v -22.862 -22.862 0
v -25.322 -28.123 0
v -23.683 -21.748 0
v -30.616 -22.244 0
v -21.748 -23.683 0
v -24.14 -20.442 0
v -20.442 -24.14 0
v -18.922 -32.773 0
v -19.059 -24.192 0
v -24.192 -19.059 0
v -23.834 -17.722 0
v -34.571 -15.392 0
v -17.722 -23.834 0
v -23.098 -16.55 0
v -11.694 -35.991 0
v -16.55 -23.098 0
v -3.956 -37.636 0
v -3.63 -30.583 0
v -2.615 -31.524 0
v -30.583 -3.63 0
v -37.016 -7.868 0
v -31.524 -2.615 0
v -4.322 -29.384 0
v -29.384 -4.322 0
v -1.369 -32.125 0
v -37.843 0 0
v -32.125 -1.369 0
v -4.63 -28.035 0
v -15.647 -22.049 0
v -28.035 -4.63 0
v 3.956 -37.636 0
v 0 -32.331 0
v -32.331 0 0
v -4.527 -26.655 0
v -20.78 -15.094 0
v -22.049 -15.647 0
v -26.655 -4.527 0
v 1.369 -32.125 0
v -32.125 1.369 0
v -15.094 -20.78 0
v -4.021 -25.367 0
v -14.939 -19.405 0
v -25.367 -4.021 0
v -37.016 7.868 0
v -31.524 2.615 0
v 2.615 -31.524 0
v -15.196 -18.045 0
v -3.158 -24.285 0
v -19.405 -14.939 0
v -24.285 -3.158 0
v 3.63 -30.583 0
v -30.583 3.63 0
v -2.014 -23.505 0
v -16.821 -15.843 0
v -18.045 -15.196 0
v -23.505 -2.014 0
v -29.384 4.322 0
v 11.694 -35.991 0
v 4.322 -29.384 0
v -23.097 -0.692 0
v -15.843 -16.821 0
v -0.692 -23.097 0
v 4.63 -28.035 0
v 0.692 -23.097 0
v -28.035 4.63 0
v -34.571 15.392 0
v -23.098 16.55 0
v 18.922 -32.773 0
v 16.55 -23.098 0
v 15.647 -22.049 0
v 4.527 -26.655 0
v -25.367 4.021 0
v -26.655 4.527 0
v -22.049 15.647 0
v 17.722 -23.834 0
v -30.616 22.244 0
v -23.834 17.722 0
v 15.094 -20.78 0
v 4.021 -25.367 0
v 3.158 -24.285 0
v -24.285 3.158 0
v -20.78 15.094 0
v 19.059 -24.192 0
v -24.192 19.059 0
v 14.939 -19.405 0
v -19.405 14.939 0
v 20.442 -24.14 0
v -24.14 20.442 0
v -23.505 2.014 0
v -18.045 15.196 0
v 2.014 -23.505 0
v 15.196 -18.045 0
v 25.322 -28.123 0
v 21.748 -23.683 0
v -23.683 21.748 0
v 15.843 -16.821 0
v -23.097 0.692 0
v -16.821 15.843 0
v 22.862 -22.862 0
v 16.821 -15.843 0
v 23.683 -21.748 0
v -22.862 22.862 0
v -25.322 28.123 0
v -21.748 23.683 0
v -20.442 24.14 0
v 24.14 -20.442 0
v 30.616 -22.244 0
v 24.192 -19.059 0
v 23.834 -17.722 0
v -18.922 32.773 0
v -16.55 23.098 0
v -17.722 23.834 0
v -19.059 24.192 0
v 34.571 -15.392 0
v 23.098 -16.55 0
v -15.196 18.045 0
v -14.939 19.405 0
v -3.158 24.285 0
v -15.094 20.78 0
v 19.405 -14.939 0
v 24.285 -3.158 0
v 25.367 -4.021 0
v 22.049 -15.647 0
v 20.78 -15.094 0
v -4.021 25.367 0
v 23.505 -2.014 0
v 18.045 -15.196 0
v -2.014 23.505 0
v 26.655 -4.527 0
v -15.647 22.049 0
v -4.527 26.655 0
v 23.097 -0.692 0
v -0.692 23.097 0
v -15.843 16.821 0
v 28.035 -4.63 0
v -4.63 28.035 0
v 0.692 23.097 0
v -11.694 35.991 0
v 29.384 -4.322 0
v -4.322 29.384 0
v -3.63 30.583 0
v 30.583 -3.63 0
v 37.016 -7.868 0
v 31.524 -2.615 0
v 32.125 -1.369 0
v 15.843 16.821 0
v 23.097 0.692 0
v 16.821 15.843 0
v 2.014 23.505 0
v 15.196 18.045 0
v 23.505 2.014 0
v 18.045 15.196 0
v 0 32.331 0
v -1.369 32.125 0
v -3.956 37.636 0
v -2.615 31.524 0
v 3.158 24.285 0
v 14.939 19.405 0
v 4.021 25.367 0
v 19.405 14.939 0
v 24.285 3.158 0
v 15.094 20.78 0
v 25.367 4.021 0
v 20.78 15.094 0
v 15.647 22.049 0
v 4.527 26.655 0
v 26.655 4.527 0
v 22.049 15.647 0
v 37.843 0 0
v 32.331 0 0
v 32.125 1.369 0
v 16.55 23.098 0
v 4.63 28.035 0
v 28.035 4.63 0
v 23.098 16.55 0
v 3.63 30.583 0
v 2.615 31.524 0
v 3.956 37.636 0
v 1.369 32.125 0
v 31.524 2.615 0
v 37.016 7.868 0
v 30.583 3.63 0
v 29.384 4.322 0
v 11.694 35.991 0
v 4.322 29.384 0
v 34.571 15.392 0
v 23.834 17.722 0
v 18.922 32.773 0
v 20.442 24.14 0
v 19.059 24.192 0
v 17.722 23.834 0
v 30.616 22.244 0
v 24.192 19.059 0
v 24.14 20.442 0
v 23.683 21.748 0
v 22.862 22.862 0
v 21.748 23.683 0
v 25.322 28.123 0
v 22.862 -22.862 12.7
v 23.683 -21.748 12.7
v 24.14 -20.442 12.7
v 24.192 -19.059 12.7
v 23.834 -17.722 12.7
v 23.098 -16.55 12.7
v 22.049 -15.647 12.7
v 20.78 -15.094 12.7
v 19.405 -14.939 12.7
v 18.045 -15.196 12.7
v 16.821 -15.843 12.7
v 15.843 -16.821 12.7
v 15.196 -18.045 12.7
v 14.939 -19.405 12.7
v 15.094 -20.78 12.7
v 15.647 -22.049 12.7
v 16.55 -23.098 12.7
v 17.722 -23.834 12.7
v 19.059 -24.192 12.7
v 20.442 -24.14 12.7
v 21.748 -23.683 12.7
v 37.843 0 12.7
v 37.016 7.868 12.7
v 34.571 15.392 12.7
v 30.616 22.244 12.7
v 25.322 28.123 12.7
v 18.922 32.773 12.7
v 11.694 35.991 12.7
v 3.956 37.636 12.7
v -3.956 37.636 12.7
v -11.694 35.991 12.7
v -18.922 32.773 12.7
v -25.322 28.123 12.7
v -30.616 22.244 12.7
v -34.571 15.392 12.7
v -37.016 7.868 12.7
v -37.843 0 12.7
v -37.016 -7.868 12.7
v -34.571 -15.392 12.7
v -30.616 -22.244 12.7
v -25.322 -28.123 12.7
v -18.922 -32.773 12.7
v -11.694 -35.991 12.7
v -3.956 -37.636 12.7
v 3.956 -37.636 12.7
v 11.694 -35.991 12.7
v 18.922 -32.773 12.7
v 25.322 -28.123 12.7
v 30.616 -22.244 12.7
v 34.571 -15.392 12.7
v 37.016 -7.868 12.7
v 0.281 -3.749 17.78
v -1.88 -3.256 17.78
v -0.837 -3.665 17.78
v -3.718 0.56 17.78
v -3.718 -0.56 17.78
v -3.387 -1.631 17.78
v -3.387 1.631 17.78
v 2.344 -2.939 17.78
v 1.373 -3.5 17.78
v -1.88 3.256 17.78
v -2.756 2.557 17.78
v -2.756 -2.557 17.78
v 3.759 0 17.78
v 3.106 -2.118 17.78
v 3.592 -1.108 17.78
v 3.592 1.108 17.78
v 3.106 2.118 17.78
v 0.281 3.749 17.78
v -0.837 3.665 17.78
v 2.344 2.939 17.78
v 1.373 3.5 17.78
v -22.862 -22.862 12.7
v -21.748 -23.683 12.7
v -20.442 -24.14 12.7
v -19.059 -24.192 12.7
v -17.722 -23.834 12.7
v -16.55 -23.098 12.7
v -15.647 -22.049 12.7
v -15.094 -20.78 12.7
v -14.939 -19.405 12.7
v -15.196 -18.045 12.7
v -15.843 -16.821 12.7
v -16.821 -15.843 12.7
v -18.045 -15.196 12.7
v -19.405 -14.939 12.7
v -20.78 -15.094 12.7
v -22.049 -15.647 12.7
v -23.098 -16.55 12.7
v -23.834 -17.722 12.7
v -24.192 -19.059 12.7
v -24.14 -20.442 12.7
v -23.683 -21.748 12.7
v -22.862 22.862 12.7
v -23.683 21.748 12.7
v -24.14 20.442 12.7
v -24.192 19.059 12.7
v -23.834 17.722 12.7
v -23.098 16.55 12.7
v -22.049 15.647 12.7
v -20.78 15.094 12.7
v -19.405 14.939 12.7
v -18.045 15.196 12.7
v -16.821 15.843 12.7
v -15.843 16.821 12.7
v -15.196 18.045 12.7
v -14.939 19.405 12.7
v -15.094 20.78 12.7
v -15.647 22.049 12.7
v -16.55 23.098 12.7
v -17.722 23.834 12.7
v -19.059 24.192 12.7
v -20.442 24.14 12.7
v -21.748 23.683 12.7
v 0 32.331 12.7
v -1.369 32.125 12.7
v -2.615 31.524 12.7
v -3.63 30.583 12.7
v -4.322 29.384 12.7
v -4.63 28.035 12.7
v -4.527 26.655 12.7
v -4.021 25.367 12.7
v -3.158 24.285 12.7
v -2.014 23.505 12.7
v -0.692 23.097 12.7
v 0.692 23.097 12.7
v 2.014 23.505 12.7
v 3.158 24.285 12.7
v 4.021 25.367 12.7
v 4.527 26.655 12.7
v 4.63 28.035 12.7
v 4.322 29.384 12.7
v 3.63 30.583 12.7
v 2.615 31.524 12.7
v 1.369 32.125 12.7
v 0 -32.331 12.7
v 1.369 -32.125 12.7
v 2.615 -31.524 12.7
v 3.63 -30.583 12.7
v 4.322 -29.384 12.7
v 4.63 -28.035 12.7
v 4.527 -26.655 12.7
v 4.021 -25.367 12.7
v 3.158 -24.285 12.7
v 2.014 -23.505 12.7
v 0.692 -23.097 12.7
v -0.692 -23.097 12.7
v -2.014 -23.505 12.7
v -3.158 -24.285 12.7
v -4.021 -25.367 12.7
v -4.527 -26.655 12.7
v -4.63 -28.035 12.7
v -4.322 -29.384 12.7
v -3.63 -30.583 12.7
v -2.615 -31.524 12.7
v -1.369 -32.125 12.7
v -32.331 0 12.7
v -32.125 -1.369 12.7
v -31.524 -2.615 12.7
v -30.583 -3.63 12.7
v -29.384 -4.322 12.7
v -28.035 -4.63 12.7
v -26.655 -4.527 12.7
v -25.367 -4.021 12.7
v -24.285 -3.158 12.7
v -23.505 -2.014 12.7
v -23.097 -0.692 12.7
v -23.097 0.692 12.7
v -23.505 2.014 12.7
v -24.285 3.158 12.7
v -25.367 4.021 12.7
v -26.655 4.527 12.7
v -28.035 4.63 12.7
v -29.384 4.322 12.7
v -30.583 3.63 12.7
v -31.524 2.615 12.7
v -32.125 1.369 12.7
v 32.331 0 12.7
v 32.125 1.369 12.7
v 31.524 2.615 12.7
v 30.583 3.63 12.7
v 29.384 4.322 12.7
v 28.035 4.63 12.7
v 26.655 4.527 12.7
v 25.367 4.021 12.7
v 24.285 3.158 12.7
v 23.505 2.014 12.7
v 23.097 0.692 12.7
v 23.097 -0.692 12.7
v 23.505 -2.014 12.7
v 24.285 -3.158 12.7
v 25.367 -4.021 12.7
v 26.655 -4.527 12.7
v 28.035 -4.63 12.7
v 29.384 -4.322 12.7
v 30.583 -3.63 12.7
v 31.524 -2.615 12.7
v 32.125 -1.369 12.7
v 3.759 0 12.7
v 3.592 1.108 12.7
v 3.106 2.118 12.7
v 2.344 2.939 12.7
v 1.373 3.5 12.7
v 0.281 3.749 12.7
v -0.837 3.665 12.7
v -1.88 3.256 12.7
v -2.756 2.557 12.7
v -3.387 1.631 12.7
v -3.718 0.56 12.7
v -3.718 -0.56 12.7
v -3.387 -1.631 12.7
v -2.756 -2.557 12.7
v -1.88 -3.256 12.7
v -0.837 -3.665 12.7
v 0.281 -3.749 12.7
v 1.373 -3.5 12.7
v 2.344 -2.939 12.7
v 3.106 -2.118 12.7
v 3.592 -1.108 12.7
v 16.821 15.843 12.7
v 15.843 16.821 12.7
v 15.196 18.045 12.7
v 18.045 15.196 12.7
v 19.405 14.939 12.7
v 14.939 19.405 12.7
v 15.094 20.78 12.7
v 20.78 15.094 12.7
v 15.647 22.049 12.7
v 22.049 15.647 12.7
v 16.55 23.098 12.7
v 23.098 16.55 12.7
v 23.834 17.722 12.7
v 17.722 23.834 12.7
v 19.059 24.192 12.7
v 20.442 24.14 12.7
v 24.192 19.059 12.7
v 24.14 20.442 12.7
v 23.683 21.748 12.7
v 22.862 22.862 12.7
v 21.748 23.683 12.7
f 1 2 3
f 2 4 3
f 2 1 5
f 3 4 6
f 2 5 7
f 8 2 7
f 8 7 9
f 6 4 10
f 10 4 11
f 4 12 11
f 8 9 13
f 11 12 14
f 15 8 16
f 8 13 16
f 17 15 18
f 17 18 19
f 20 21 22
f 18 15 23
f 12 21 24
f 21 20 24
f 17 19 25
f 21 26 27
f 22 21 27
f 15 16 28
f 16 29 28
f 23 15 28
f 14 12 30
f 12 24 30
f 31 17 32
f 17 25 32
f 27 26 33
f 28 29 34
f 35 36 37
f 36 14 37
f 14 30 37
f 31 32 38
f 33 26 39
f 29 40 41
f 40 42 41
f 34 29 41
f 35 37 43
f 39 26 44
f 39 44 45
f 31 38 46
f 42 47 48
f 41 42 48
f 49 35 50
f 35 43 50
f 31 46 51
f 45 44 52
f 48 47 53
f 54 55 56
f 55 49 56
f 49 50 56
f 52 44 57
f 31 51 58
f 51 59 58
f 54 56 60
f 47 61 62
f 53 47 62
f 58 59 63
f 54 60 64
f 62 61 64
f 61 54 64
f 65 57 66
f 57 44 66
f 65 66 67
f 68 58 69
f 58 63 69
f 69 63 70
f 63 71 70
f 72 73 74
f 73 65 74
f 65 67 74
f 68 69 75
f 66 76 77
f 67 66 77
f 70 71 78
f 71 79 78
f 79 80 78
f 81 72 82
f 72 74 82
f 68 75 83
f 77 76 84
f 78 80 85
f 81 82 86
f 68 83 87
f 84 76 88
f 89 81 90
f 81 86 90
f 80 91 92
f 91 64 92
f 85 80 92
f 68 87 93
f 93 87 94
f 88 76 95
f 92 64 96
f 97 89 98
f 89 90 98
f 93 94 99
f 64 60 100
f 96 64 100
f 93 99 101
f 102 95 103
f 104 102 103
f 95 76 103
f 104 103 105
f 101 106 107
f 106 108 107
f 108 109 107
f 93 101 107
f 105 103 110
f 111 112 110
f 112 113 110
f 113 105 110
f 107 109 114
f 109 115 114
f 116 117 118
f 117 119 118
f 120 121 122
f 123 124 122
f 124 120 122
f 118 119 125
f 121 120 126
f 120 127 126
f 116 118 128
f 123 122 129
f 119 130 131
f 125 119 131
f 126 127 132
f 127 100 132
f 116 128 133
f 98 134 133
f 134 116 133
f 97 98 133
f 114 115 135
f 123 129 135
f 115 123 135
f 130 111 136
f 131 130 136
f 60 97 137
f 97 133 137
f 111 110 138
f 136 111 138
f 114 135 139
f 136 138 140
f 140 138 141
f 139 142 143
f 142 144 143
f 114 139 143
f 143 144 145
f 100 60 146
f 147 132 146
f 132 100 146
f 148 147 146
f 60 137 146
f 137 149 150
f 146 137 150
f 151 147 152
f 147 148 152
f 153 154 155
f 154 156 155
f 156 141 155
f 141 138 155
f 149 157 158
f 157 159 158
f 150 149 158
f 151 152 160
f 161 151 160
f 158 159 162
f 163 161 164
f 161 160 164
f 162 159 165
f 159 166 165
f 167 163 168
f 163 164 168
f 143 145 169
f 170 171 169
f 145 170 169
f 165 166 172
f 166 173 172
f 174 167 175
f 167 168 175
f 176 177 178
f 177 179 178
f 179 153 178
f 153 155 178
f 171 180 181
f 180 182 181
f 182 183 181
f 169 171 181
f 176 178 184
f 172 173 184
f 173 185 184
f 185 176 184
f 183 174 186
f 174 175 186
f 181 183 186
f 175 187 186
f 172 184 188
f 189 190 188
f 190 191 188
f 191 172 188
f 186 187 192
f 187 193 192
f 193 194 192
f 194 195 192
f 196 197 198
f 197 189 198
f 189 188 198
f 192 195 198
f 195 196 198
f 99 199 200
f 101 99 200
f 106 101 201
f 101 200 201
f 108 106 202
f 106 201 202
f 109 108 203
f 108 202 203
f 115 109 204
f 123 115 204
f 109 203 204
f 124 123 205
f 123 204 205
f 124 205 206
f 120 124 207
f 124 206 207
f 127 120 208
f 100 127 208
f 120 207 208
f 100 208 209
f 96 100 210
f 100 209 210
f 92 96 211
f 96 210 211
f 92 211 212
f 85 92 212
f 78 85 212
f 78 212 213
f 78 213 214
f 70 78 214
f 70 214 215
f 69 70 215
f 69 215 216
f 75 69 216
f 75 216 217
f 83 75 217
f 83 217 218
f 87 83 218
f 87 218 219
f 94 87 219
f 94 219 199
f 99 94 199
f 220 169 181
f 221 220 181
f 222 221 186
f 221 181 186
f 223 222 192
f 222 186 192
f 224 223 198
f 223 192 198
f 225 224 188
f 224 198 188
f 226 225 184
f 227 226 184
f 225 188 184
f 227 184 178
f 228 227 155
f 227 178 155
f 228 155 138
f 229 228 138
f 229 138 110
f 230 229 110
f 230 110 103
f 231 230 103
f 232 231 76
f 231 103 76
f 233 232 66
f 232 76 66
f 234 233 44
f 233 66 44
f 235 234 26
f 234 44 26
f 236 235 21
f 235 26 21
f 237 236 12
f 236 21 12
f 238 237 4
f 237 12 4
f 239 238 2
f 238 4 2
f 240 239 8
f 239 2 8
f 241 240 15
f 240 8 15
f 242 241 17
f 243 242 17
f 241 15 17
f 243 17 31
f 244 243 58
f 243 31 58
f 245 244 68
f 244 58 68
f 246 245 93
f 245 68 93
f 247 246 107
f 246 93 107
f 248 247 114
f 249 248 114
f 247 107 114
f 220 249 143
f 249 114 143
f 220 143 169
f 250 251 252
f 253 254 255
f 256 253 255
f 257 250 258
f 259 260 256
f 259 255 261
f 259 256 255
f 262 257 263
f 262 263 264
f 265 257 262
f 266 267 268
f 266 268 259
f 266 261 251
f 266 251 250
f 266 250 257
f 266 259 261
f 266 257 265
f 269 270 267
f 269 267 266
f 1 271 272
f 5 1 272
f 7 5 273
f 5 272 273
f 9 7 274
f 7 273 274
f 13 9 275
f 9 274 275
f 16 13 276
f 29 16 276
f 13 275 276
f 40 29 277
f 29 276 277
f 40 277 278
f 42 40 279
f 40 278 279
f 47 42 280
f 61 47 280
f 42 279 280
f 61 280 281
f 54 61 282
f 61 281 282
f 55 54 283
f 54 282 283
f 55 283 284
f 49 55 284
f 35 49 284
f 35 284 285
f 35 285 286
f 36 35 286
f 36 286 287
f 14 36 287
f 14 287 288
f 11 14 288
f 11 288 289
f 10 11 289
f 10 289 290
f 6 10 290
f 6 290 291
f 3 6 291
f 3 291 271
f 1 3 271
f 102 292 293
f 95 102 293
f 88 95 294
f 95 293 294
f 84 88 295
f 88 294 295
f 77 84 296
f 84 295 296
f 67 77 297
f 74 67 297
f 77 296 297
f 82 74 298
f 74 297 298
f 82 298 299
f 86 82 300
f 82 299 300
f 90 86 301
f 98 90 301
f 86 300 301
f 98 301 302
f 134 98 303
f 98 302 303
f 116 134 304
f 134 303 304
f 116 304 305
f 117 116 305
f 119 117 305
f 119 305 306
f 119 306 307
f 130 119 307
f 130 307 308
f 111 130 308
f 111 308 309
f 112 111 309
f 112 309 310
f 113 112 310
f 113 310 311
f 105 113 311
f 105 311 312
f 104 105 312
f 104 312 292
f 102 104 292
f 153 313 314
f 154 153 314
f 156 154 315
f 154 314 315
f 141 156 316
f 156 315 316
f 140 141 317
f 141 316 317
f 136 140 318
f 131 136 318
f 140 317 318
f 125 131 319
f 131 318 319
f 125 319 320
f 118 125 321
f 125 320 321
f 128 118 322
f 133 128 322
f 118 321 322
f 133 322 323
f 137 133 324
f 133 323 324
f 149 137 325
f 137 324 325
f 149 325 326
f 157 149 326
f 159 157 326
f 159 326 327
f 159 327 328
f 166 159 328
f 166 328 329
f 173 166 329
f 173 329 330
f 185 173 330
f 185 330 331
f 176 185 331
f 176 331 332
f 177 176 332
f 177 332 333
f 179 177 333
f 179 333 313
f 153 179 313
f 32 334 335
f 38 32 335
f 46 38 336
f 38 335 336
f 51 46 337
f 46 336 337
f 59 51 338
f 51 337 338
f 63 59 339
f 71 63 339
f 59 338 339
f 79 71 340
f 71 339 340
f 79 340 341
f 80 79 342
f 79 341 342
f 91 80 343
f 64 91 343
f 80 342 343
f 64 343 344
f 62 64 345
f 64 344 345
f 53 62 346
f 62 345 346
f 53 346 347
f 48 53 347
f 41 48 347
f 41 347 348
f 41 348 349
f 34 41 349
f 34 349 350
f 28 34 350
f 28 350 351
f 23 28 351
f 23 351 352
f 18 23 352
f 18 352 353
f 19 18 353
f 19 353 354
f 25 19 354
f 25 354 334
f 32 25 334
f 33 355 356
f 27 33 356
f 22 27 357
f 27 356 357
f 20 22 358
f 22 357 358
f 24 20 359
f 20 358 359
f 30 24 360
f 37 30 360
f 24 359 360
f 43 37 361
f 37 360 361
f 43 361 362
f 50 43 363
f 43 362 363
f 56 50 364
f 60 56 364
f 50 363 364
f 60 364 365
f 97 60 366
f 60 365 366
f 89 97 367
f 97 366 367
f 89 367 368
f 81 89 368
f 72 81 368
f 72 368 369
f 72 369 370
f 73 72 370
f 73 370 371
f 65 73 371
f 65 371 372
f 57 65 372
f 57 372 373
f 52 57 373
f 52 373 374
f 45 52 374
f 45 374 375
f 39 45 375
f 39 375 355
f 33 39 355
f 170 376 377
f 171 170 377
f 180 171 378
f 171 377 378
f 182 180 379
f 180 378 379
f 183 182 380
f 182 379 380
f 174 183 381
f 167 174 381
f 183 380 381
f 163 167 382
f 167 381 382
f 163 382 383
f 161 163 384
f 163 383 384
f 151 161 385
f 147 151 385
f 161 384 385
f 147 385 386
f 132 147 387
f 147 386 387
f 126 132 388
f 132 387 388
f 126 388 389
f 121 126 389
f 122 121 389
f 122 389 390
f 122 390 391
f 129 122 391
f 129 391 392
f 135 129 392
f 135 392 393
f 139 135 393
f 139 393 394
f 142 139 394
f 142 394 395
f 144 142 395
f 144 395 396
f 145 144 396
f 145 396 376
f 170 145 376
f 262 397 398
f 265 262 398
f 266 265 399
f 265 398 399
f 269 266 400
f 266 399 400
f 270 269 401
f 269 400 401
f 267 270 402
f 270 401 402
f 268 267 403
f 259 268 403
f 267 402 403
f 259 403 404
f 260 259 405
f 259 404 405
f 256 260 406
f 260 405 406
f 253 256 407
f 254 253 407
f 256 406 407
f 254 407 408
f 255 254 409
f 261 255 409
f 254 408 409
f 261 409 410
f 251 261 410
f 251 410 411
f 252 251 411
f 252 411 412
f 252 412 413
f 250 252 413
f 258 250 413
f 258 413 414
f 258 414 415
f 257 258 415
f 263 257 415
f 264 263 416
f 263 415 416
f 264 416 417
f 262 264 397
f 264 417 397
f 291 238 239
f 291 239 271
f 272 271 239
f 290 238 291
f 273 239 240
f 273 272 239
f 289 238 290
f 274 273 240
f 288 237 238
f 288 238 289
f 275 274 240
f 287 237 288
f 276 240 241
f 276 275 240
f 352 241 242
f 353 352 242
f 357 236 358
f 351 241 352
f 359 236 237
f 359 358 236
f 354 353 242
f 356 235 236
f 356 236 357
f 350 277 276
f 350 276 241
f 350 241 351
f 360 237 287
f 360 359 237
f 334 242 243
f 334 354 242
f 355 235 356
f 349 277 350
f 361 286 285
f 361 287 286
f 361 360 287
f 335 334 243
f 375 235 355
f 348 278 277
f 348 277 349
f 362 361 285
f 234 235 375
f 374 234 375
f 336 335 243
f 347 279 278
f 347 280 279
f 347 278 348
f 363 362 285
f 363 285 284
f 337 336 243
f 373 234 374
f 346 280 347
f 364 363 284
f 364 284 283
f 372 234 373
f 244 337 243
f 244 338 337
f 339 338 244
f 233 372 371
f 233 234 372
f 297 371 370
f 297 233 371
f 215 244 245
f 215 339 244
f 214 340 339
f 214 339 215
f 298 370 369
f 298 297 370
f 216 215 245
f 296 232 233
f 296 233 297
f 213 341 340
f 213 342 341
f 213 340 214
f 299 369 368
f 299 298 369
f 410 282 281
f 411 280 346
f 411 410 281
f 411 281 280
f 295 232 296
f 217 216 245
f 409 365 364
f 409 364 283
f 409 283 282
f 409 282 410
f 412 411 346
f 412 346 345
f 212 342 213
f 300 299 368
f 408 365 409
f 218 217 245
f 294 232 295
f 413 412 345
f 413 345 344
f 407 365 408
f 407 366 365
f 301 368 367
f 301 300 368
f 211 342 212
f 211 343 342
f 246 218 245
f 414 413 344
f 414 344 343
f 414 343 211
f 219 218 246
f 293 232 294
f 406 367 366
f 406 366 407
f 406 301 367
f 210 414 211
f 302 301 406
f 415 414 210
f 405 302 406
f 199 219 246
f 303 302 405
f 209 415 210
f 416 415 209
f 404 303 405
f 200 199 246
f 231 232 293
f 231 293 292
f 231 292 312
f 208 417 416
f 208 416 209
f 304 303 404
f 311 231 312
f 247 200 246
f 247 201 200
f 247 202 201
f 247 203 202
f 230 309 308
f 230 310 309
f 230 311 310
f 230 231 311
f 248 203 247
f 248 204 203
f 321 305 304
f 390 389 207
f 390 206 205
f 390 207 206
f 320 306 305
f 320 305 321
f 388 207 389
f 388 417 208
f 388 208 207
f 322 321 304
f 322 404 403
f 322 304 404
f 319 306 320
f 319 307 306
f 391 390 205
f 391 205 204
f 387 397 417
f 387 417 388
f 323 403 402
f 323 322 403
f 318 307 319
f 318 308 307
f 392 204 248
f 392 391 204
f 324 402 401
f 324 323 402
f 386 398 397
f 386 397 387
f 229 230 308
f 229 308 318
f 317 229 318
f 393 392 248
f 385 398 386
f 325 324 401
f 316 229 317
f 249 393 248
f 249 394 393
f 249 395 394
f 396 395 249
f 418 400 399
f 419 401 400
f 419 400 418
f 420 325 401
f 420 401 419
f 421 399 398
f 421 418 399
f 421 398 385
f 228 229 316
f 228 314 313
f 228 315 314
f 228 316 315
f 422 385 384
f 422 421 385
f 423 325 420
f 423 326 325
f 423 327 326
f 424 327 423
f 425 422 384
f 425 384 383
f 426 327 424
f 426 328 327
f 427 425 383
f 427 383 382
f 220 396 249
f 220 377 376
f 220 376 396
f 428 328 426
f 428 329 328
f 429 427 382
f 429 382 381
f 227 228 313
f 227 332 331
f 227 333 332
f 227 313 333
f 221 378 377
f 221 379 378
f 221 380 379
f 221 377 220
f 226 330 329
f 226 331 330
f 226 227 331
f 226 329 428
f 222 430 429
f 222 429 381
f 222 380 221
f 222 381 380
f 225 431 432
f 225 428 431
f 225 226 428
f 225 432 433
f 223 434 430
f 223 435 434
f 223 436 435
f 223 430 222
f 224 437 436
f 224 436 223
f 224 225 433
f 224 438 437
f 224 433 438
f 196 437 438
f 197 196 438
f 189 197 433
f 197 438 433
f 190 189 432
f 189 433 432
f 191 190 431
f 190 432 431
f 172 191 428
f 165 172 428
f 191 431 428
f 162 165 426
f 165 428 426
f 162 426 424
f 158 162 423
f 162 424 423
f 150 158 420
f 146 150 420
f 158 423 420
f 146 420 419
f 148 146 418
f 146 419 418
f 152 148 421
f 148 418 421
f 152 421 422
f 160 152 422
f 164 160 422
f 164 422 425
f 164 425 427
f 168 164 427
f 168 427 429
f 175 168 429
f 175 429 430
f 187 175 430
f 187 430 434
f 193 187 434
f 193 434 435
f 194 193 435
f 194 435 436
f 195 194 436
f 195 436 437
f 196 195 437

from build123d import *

# Parameters (mm, degrees)
SKETCH1_R           = 37.843146067
BOSS_EXTRUDE1_DEPTH = 12.7
SKETCH2_R           = 3.759495298
BOSS_EXTRUDE2_DEPTH = 5.08
SKETCH4_R           = 4.642939976
CUT_EXTRUDE1_DEPTH  = 56.00452171
CIRPATTERN1_COUNT   = 8


with BuildPart() as part:
    # Sketch1 → Boss-Extrude1 (new body)
    with BuildSketch(Plane.XY):
        Circle(SKETCH1_R)
    extrude(amount=BOSS_EXTRUDE1_DEPTH)

    # Sketch2 → Boss-Extrude2 (add)
    with BuildSketch(Plane.XY.offset(12.7)):
        Circle(SKETCH2_R)
    extrude(amount=BOSS_EXTRUDE2_DEPTH)

    # Sketch4 → Cut-Extrude1 (cut, through all)
    with BuildSketch(Plane.XY.offset(12.7)):
        with Locations((27.688174832, 0)):
            Circle(SKETCH4_R)
    cut_extrude1 = extrude(amount=-CUT_EXTRUDE1_DEPTH, mode=Mode.SUBTRACT)

    # CirPattern1: Cut-Extrude1 ×8 about axis
    cirpattern1_axis = Axis((0, 0, 0), (0, 0, 1))
    for i in range(1, CIRPATTERN1_COUNT):
        add(cut_extrude1.rotate(cirpattern1_axis, i * 360 / CIRPATTERN1_COUNT), mode=Mode.SUBTRACT)


solid = part.part
